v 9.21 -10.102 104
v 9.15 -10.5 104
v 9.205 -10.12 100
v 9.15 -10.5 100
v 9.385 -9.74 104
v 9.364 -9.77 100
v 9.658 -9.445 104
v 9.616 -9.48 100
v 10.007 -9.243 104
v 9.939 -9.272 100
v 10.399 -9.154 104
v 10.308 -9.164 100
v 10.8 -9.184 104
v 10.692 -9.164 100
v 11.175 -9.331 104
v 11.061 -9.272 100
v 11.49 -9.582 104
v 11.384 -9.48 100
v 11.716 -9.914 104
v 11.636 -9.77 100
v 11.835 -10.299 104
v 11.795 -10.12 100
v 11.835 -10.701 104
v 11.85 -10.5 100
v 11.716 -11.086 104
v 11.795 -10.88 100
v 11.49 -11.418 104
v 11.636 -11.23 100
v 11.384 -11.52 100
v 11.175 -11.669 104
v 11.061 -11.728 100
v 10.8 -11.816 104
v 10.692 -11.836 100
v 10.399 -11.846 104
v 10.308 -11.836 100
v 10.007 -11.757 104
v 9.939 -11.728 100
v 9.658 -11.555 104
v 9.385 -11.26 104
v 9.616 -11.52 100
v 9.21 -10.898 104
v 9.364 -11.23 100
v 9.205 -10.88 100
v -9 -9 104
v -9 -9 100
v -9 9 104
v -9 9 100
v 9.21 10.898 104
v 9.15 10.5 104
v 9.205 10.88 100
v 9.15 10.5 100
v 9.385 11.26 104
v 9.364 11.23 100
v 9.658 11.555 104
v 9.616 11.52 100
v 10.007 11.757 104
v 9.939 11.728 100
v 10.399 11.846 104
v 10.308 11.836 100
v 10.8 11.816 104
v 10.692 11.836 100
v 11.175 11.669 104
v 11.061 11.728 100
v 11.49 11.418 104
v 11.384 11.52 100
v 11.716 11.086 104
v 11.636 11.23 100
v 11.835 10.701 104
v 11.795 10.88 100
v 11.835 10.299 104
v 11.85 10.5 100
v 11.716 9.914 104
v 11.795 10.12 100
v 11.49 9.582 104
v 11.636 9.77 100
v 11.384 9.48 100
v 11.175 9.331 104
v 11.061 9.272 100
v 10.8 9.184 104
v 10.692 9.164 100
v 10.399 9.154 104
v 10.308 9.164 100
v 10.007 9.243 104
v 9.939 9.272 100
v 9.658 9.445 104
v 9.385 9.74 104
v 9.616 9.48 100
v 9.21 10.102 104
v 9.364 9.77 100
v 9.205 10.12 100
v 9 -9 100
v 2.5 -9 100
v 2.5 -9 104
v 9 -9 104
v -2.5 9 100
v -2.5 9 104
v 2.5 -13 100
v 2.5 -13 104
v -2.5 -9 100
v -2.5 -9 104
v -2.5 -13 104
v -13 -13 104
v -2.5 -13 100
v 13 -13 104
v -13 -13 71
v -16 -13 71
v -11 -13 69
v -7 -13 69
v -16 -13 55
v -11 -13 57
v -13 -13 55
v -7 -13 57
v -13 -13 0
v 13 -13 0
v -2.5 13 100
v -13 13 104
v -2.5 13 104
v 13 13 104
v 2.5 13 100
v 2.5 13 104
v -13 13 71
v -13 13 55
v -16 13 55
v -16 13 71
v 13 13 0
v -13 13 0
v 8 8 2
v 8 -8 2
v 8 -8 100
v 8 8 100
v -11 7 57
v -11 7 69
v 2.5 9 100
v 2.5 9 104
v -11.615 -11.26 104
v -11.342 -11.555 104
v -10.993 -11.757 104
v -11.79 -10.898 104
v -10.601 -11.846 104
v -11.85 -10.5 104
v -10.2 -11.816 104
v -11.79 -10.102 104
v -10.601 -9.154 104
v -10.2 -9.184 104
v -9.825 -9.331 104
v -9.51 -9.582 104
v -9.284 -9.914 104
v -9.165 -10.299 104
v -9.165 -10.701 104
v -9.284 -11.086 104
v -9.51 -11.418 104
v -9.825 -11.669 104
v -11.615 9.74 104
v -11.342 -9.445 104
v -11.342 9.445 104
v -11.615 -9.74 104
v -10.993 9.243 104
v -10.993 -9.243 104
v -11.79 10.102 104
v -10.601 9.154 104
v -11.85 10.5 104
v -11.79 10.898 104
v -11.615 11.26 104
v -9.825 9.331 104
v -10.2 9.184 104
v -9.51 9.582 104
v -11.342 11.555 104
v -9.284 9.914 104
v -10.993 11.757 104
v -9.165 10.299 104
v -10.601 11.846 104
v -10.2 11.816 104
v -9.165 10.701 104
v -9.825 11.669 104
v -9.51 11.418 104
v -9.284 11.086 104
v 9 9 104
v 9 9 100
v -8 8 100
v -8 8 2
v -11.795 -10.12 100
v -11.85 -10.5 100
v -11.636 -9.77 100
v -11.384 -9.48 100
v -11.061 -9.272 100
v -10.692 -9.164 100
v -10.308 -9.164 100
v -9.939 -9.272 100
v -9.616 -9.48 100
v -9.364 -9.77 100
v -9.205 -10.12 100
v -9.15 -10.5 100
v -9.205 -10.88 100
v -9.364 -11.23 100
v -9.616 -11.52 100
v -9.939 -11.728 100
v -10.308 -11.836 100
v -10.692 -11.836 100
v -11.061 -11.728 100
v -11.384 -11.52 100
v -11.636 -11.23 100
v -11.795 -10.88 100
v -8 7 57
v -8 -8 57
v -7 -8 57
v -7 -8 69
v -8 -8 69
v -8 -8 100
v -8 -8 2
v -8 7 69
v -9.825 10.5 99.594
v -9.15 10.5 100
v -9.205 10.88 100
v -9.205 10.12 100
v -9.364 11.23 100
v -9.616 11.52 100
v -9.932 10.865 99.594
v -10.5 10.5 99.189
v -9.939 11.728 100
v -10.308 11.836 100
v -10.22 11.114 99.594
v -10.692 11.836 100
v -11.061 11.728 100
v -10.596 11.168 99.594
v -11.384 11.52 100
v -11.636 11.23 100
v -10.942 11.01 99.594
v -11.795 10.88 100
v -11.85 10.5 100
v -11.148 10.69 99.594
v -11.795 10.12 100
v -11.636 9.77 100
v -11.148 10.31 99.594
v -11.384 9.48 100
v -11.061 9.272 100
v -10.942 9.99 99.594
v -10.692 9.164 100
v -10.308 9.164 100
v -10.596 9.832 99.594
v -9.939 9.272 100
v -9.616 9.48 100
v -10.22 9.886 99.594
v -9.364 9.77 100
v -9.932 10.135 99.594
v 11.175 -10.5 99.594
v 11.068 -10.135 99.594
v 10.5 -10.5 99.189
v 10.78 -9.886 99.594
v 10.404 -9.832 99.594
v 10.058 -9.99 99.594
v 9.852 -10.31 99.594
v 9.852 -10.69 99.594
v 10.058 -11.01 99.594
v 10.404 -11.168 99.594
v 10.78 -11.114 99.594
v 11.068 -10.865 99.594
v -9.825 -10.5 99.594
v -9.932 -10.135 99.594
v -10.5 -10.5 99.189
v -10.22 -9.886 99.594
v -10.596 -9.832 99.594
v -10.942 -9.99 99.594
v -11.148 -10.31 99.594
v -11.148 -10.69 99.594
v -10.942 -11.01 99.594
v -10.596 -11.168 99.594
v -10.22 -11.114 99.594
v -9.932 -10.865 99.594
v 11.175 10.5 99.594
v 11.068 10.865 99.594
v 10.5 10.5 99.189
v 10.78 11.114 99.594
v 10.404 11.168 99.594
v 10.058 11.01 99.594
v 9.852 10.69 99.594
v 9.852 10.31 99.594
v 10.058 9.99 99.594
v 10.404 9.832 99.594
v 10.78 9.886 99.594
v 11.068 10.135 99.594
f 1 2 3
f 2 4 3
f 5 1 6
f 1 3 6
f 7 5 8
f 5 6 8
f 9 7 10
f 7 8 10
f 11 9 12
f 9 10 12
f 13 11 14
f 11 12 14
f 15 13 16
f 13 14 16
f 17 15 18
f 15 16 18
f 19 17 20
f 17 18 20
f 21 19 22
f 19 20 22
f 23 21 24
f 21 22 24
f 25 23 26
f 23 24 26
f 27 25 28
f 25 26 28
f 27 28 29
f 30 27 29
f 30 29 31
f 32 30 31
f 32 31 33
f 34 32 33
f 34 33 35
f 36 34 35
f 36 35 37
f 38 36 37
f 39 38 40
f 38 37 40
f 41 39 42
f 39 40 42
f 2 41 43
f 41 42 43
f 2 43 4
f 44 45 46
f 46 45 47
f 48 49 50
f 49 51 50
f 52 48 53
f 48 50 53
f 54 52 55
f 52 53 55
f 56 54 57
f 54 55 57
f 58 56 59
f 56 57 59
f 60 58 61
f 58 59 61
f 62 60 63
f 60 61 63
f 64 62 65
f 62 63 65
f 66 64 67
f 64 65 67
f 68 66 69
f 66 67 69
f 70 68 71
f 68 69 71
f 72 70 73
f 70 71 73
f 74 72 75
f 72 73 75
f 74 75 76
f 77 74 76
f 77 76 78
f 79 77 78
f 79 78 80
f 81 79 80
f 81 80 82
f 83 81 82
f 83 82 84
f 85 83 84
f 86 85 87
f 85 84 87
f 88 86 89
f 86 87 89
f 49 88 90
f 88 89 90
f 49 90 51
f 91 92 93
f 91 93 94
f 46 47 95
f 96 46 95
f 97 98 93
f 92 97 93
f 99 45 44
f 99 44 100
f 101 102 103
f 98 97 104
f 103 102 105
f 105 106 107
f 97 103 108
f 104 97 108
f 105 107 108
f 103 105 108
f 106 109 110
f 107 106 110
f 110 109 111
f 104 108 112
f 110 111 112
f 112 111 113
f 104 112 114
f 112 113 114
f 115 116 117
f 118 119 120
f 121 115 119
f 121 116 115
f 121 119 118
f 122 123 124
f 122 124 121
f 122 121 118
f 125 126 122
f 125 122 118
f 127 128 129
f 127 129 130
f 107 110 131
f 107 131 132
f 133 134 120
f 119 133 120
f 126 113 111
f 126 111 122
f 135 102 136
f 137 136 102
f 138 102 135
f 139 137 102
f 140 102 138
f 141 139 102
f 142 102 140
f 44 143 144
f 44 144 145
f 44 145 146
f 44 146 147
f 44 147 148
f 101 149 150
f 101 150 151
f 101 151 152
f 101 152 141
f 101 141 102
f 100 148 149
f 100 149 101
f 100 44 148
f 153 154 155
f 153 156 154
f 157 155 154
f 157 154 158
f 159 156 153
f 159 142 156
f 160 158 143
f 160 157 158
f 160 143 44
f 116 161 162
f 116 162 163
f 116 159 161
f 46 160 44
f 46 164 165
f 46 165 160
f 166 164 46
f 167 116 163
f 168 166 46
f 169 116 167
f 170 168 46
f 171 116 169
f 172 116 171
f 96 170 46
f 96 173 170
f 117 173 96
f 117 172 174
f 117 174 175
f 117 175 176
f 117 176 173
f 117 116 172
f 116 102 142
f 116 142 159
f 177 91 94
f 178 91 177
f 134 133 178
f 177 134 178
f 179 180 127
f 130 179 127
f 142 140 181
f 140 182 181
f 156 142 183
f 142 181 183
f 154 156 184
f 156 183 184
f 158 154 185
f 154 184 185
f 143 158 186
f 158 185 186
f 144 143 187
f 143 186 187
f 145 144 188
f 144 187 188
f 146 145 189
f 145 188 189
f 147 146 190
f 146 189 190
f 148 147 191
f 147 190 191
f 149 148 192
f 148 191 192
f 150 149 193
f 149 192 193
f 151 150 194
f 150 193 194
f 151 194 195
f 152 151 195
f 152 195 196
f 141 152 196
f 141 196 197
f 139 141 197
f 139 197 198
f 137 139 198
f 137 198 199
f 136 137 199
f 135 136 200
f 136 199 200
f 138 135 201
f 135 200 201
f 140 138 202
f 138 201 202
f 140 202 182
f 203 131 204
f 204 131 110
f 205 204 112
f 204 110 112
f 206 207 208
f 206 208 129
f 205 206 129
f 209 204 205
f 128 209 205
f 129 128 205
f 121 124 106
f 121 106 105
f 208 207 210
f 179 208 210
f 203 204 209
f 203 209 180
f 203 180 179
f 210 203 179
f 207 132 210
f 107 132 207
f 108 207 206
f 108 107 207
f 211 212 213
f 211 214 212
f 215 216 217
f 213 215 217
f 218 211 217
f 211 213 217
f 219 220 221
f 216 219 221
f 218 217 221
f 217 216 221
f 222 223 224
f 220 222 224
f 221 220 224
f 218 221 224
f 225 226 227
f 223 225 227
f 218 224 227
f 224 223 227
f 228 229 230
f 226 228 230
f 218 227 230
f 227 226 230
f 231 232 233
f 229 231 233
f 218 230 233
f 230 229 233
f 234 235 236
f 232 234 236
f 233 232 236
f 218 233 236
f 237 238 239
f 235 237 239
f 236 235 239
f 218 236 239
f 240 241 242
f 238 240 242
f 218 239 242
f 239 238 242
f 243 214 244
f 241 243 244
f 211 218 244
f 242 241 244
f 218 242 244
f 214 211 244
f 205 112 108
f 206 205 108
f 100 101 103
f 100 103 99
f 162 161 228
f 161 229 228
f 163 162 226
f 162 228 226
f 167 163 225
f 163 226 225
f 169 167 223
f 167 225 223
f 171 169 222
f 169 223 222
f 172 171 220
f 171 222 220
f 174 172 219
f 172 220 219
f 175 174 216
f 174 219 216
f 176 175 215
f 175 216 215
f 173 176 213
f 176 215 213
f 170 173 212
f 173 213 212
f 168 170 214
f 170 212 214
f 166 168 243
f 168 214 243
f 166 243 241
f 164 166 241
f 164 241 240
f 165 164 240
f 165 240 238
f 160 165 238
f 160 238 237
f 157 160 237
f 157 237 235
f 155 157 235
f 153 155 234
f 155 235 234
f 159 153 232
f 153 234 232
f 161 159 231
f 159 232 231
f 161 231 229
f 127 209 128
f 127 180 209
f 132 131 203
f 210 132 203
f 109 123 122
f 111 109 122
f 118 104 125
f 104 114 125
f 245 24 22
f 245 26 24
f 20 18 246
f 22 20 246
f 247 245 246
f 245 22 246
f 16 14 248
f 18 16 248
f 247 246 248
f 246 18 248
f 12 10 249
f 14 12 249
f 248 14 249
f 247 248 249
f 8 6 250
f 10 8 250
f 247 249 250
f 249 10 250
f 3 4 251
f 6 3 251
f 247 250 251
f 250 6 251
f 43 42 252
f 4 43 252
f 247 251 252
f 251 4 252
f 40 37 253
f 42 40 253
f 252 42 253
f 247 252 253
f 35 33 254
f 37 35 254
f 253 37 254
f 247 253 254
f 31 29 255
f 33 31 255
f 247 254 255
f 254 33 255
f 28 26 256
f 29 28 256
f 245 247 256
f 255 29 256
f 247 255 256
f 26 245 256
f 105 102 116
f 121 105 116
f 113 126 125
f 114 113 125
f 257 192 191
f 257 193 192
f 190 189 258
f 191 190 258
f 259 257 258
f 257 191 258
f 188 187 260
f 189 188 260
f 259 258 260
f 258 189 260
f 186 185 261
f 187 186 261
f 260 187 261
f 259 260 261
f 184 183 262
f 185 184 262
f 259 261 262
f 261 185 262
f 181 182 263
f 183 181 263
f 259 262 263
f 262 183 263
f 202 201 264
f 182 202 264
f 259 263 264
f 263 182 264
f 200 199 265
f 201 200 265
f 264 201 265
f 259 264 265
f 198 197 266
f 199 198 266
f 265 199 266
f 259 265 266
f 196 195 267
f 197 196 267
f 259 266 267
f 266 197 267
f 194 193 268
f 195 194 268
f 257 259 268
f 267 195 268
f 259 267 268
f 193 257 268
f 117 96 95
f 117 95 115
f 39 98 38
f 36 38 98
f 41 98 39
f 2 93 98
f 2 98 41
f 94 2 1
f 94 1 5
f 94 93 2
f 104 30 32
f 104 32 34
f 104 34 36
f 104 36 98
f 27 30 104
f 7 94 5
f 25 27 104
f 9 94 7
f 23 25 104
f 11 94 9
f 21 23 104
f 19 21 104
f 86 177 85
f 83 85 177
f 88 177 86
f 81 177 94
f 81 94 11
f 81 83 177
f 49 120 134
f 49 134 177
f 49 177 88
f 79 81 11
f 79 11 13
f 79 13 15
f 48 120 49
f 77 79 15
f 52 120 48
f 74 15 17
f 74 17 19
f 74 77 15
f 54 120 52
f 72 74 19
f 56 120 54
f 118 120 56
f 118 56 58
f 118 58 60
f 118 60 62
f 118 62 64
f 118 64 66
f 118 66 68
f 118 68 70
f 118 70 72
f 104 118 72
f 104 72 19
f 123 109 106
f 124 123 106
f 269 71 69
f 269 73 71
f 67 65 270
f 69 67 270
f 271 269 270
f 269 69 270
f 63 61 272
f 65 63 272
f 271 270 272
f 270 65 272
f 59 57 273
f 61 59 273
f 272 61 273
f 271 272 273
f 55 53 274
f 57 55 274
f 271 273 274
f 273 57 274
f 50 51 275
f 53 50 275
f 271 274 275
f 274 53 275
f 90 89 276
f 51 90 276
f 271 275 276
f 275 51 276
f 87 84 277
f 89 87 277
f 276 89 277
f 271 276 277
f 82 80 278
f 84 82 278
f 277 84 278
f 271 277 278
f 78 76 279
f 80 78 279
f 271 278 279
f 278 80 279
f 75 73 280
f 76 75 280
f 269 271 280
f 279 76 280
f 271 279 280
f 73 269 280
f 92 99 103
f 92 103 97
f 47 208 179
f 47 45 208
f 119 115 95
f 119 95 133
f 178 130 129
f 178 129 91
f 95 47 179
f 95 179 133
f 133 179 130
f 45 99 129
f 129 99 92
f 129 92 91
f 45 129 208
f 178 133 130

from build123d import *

# Parameters (mm, degrees)
F0_W      = 26
F0_H      = 26
F0_W_2    = 16
F0_H_2    = 16
F1_DEPTH  = 2
F2_DEPTH  = 100
F3_W      = 26
F3_H      = 26
F3_W_2    = 18
F3_H_2    = 18
F4_DEPTH  = 4
F5_W      = 5
F5_H      = 4
F6_DEPTH  = 4
F7_D      = 2.7
F7_DEPTH  = 4
F7_TIP    = 0.8111618357
F9_W      = 3
F9_H      = 16
F10_DEPTH = 26
F11_W     = 4
F11_H     = 12
F12_DEPTH = 20


with BuildPart() as f1:
    # F0 (on Top) → F1 (new body)
    with BuildSketch(Plane.XY):
        Rectangle(F0_W, F0_H)
        Rectangle(F0_W_2, F0_H_2, mode=Mode.SUBTRACT)
        Rectangle(F0_W_2, F0_H_2)
    extrude(amount=F1_DEPTH)

    # F0 (on Top) → F2 (join)
    with BuildSketch(Plane.XY):
        Rectangle(F0_W, F0_H)
        Rectangle(F0_W_2, F0_H_2, mode=Mode.SUBTRACT)
    extrude(amount=F2_DEPTH)

    # F3 (on face) → F4 (join)
    with BuildSketch(Plane.XY.offset(100)):
        Rectangle(F3_W, F3_H)
        Rectangle(F3_W_2, F3_H_2, mode=Mode.SUBTRACT)
    extrude(amount=F4_DEPTH)

    # F5 (on face) → F6 (cut, through all)
    with BuildSketch(Plane.XY.offset(104)):
        with Locations((0, -11)):
            Rectangle(F5_W, F5_H)
        with Locations((0, 11)):
            Rectangle(F5_W, F5_H)
    extrude(amount=-F6_DEPTH, mode=Mode.SUBTRACT)

    # F7
    with Locations(Plane.XY.offset(104)):
        with Locations((-10.5, 10.5), (10.5, 10.5), (-10.5, -10.5), (10.5, -10.5)):
            Hole(F7_D / 2, depth=F7_DEPTH)
            with Locations((0, 0, -(F7_DEPTH + F7_TIP / 2))):  # 118° drill point
                Cone(0, F7_D / 2, F7_TIP, mode=Mode.SUBTRACT)

    # F9 (on face) → F10 (join)
    with BuildSketch(Plane.XZ.offset(13)):
        with Locations((-14.5, 63)):
            Rectangle(F9_W, F9_H)
    extrude(amount=-F10_DEPTH)

    # F11 (on face) → F12 (cut)
    with BuildSketch(Plane.XZ.offset(13)):
        with Locations((-9, 63)):
            Rectangle(F11_W, F11_H)
    extrude(amount=-F12_DEPTH, mode=Mode.SUBTRACT)


solid = f1.part
